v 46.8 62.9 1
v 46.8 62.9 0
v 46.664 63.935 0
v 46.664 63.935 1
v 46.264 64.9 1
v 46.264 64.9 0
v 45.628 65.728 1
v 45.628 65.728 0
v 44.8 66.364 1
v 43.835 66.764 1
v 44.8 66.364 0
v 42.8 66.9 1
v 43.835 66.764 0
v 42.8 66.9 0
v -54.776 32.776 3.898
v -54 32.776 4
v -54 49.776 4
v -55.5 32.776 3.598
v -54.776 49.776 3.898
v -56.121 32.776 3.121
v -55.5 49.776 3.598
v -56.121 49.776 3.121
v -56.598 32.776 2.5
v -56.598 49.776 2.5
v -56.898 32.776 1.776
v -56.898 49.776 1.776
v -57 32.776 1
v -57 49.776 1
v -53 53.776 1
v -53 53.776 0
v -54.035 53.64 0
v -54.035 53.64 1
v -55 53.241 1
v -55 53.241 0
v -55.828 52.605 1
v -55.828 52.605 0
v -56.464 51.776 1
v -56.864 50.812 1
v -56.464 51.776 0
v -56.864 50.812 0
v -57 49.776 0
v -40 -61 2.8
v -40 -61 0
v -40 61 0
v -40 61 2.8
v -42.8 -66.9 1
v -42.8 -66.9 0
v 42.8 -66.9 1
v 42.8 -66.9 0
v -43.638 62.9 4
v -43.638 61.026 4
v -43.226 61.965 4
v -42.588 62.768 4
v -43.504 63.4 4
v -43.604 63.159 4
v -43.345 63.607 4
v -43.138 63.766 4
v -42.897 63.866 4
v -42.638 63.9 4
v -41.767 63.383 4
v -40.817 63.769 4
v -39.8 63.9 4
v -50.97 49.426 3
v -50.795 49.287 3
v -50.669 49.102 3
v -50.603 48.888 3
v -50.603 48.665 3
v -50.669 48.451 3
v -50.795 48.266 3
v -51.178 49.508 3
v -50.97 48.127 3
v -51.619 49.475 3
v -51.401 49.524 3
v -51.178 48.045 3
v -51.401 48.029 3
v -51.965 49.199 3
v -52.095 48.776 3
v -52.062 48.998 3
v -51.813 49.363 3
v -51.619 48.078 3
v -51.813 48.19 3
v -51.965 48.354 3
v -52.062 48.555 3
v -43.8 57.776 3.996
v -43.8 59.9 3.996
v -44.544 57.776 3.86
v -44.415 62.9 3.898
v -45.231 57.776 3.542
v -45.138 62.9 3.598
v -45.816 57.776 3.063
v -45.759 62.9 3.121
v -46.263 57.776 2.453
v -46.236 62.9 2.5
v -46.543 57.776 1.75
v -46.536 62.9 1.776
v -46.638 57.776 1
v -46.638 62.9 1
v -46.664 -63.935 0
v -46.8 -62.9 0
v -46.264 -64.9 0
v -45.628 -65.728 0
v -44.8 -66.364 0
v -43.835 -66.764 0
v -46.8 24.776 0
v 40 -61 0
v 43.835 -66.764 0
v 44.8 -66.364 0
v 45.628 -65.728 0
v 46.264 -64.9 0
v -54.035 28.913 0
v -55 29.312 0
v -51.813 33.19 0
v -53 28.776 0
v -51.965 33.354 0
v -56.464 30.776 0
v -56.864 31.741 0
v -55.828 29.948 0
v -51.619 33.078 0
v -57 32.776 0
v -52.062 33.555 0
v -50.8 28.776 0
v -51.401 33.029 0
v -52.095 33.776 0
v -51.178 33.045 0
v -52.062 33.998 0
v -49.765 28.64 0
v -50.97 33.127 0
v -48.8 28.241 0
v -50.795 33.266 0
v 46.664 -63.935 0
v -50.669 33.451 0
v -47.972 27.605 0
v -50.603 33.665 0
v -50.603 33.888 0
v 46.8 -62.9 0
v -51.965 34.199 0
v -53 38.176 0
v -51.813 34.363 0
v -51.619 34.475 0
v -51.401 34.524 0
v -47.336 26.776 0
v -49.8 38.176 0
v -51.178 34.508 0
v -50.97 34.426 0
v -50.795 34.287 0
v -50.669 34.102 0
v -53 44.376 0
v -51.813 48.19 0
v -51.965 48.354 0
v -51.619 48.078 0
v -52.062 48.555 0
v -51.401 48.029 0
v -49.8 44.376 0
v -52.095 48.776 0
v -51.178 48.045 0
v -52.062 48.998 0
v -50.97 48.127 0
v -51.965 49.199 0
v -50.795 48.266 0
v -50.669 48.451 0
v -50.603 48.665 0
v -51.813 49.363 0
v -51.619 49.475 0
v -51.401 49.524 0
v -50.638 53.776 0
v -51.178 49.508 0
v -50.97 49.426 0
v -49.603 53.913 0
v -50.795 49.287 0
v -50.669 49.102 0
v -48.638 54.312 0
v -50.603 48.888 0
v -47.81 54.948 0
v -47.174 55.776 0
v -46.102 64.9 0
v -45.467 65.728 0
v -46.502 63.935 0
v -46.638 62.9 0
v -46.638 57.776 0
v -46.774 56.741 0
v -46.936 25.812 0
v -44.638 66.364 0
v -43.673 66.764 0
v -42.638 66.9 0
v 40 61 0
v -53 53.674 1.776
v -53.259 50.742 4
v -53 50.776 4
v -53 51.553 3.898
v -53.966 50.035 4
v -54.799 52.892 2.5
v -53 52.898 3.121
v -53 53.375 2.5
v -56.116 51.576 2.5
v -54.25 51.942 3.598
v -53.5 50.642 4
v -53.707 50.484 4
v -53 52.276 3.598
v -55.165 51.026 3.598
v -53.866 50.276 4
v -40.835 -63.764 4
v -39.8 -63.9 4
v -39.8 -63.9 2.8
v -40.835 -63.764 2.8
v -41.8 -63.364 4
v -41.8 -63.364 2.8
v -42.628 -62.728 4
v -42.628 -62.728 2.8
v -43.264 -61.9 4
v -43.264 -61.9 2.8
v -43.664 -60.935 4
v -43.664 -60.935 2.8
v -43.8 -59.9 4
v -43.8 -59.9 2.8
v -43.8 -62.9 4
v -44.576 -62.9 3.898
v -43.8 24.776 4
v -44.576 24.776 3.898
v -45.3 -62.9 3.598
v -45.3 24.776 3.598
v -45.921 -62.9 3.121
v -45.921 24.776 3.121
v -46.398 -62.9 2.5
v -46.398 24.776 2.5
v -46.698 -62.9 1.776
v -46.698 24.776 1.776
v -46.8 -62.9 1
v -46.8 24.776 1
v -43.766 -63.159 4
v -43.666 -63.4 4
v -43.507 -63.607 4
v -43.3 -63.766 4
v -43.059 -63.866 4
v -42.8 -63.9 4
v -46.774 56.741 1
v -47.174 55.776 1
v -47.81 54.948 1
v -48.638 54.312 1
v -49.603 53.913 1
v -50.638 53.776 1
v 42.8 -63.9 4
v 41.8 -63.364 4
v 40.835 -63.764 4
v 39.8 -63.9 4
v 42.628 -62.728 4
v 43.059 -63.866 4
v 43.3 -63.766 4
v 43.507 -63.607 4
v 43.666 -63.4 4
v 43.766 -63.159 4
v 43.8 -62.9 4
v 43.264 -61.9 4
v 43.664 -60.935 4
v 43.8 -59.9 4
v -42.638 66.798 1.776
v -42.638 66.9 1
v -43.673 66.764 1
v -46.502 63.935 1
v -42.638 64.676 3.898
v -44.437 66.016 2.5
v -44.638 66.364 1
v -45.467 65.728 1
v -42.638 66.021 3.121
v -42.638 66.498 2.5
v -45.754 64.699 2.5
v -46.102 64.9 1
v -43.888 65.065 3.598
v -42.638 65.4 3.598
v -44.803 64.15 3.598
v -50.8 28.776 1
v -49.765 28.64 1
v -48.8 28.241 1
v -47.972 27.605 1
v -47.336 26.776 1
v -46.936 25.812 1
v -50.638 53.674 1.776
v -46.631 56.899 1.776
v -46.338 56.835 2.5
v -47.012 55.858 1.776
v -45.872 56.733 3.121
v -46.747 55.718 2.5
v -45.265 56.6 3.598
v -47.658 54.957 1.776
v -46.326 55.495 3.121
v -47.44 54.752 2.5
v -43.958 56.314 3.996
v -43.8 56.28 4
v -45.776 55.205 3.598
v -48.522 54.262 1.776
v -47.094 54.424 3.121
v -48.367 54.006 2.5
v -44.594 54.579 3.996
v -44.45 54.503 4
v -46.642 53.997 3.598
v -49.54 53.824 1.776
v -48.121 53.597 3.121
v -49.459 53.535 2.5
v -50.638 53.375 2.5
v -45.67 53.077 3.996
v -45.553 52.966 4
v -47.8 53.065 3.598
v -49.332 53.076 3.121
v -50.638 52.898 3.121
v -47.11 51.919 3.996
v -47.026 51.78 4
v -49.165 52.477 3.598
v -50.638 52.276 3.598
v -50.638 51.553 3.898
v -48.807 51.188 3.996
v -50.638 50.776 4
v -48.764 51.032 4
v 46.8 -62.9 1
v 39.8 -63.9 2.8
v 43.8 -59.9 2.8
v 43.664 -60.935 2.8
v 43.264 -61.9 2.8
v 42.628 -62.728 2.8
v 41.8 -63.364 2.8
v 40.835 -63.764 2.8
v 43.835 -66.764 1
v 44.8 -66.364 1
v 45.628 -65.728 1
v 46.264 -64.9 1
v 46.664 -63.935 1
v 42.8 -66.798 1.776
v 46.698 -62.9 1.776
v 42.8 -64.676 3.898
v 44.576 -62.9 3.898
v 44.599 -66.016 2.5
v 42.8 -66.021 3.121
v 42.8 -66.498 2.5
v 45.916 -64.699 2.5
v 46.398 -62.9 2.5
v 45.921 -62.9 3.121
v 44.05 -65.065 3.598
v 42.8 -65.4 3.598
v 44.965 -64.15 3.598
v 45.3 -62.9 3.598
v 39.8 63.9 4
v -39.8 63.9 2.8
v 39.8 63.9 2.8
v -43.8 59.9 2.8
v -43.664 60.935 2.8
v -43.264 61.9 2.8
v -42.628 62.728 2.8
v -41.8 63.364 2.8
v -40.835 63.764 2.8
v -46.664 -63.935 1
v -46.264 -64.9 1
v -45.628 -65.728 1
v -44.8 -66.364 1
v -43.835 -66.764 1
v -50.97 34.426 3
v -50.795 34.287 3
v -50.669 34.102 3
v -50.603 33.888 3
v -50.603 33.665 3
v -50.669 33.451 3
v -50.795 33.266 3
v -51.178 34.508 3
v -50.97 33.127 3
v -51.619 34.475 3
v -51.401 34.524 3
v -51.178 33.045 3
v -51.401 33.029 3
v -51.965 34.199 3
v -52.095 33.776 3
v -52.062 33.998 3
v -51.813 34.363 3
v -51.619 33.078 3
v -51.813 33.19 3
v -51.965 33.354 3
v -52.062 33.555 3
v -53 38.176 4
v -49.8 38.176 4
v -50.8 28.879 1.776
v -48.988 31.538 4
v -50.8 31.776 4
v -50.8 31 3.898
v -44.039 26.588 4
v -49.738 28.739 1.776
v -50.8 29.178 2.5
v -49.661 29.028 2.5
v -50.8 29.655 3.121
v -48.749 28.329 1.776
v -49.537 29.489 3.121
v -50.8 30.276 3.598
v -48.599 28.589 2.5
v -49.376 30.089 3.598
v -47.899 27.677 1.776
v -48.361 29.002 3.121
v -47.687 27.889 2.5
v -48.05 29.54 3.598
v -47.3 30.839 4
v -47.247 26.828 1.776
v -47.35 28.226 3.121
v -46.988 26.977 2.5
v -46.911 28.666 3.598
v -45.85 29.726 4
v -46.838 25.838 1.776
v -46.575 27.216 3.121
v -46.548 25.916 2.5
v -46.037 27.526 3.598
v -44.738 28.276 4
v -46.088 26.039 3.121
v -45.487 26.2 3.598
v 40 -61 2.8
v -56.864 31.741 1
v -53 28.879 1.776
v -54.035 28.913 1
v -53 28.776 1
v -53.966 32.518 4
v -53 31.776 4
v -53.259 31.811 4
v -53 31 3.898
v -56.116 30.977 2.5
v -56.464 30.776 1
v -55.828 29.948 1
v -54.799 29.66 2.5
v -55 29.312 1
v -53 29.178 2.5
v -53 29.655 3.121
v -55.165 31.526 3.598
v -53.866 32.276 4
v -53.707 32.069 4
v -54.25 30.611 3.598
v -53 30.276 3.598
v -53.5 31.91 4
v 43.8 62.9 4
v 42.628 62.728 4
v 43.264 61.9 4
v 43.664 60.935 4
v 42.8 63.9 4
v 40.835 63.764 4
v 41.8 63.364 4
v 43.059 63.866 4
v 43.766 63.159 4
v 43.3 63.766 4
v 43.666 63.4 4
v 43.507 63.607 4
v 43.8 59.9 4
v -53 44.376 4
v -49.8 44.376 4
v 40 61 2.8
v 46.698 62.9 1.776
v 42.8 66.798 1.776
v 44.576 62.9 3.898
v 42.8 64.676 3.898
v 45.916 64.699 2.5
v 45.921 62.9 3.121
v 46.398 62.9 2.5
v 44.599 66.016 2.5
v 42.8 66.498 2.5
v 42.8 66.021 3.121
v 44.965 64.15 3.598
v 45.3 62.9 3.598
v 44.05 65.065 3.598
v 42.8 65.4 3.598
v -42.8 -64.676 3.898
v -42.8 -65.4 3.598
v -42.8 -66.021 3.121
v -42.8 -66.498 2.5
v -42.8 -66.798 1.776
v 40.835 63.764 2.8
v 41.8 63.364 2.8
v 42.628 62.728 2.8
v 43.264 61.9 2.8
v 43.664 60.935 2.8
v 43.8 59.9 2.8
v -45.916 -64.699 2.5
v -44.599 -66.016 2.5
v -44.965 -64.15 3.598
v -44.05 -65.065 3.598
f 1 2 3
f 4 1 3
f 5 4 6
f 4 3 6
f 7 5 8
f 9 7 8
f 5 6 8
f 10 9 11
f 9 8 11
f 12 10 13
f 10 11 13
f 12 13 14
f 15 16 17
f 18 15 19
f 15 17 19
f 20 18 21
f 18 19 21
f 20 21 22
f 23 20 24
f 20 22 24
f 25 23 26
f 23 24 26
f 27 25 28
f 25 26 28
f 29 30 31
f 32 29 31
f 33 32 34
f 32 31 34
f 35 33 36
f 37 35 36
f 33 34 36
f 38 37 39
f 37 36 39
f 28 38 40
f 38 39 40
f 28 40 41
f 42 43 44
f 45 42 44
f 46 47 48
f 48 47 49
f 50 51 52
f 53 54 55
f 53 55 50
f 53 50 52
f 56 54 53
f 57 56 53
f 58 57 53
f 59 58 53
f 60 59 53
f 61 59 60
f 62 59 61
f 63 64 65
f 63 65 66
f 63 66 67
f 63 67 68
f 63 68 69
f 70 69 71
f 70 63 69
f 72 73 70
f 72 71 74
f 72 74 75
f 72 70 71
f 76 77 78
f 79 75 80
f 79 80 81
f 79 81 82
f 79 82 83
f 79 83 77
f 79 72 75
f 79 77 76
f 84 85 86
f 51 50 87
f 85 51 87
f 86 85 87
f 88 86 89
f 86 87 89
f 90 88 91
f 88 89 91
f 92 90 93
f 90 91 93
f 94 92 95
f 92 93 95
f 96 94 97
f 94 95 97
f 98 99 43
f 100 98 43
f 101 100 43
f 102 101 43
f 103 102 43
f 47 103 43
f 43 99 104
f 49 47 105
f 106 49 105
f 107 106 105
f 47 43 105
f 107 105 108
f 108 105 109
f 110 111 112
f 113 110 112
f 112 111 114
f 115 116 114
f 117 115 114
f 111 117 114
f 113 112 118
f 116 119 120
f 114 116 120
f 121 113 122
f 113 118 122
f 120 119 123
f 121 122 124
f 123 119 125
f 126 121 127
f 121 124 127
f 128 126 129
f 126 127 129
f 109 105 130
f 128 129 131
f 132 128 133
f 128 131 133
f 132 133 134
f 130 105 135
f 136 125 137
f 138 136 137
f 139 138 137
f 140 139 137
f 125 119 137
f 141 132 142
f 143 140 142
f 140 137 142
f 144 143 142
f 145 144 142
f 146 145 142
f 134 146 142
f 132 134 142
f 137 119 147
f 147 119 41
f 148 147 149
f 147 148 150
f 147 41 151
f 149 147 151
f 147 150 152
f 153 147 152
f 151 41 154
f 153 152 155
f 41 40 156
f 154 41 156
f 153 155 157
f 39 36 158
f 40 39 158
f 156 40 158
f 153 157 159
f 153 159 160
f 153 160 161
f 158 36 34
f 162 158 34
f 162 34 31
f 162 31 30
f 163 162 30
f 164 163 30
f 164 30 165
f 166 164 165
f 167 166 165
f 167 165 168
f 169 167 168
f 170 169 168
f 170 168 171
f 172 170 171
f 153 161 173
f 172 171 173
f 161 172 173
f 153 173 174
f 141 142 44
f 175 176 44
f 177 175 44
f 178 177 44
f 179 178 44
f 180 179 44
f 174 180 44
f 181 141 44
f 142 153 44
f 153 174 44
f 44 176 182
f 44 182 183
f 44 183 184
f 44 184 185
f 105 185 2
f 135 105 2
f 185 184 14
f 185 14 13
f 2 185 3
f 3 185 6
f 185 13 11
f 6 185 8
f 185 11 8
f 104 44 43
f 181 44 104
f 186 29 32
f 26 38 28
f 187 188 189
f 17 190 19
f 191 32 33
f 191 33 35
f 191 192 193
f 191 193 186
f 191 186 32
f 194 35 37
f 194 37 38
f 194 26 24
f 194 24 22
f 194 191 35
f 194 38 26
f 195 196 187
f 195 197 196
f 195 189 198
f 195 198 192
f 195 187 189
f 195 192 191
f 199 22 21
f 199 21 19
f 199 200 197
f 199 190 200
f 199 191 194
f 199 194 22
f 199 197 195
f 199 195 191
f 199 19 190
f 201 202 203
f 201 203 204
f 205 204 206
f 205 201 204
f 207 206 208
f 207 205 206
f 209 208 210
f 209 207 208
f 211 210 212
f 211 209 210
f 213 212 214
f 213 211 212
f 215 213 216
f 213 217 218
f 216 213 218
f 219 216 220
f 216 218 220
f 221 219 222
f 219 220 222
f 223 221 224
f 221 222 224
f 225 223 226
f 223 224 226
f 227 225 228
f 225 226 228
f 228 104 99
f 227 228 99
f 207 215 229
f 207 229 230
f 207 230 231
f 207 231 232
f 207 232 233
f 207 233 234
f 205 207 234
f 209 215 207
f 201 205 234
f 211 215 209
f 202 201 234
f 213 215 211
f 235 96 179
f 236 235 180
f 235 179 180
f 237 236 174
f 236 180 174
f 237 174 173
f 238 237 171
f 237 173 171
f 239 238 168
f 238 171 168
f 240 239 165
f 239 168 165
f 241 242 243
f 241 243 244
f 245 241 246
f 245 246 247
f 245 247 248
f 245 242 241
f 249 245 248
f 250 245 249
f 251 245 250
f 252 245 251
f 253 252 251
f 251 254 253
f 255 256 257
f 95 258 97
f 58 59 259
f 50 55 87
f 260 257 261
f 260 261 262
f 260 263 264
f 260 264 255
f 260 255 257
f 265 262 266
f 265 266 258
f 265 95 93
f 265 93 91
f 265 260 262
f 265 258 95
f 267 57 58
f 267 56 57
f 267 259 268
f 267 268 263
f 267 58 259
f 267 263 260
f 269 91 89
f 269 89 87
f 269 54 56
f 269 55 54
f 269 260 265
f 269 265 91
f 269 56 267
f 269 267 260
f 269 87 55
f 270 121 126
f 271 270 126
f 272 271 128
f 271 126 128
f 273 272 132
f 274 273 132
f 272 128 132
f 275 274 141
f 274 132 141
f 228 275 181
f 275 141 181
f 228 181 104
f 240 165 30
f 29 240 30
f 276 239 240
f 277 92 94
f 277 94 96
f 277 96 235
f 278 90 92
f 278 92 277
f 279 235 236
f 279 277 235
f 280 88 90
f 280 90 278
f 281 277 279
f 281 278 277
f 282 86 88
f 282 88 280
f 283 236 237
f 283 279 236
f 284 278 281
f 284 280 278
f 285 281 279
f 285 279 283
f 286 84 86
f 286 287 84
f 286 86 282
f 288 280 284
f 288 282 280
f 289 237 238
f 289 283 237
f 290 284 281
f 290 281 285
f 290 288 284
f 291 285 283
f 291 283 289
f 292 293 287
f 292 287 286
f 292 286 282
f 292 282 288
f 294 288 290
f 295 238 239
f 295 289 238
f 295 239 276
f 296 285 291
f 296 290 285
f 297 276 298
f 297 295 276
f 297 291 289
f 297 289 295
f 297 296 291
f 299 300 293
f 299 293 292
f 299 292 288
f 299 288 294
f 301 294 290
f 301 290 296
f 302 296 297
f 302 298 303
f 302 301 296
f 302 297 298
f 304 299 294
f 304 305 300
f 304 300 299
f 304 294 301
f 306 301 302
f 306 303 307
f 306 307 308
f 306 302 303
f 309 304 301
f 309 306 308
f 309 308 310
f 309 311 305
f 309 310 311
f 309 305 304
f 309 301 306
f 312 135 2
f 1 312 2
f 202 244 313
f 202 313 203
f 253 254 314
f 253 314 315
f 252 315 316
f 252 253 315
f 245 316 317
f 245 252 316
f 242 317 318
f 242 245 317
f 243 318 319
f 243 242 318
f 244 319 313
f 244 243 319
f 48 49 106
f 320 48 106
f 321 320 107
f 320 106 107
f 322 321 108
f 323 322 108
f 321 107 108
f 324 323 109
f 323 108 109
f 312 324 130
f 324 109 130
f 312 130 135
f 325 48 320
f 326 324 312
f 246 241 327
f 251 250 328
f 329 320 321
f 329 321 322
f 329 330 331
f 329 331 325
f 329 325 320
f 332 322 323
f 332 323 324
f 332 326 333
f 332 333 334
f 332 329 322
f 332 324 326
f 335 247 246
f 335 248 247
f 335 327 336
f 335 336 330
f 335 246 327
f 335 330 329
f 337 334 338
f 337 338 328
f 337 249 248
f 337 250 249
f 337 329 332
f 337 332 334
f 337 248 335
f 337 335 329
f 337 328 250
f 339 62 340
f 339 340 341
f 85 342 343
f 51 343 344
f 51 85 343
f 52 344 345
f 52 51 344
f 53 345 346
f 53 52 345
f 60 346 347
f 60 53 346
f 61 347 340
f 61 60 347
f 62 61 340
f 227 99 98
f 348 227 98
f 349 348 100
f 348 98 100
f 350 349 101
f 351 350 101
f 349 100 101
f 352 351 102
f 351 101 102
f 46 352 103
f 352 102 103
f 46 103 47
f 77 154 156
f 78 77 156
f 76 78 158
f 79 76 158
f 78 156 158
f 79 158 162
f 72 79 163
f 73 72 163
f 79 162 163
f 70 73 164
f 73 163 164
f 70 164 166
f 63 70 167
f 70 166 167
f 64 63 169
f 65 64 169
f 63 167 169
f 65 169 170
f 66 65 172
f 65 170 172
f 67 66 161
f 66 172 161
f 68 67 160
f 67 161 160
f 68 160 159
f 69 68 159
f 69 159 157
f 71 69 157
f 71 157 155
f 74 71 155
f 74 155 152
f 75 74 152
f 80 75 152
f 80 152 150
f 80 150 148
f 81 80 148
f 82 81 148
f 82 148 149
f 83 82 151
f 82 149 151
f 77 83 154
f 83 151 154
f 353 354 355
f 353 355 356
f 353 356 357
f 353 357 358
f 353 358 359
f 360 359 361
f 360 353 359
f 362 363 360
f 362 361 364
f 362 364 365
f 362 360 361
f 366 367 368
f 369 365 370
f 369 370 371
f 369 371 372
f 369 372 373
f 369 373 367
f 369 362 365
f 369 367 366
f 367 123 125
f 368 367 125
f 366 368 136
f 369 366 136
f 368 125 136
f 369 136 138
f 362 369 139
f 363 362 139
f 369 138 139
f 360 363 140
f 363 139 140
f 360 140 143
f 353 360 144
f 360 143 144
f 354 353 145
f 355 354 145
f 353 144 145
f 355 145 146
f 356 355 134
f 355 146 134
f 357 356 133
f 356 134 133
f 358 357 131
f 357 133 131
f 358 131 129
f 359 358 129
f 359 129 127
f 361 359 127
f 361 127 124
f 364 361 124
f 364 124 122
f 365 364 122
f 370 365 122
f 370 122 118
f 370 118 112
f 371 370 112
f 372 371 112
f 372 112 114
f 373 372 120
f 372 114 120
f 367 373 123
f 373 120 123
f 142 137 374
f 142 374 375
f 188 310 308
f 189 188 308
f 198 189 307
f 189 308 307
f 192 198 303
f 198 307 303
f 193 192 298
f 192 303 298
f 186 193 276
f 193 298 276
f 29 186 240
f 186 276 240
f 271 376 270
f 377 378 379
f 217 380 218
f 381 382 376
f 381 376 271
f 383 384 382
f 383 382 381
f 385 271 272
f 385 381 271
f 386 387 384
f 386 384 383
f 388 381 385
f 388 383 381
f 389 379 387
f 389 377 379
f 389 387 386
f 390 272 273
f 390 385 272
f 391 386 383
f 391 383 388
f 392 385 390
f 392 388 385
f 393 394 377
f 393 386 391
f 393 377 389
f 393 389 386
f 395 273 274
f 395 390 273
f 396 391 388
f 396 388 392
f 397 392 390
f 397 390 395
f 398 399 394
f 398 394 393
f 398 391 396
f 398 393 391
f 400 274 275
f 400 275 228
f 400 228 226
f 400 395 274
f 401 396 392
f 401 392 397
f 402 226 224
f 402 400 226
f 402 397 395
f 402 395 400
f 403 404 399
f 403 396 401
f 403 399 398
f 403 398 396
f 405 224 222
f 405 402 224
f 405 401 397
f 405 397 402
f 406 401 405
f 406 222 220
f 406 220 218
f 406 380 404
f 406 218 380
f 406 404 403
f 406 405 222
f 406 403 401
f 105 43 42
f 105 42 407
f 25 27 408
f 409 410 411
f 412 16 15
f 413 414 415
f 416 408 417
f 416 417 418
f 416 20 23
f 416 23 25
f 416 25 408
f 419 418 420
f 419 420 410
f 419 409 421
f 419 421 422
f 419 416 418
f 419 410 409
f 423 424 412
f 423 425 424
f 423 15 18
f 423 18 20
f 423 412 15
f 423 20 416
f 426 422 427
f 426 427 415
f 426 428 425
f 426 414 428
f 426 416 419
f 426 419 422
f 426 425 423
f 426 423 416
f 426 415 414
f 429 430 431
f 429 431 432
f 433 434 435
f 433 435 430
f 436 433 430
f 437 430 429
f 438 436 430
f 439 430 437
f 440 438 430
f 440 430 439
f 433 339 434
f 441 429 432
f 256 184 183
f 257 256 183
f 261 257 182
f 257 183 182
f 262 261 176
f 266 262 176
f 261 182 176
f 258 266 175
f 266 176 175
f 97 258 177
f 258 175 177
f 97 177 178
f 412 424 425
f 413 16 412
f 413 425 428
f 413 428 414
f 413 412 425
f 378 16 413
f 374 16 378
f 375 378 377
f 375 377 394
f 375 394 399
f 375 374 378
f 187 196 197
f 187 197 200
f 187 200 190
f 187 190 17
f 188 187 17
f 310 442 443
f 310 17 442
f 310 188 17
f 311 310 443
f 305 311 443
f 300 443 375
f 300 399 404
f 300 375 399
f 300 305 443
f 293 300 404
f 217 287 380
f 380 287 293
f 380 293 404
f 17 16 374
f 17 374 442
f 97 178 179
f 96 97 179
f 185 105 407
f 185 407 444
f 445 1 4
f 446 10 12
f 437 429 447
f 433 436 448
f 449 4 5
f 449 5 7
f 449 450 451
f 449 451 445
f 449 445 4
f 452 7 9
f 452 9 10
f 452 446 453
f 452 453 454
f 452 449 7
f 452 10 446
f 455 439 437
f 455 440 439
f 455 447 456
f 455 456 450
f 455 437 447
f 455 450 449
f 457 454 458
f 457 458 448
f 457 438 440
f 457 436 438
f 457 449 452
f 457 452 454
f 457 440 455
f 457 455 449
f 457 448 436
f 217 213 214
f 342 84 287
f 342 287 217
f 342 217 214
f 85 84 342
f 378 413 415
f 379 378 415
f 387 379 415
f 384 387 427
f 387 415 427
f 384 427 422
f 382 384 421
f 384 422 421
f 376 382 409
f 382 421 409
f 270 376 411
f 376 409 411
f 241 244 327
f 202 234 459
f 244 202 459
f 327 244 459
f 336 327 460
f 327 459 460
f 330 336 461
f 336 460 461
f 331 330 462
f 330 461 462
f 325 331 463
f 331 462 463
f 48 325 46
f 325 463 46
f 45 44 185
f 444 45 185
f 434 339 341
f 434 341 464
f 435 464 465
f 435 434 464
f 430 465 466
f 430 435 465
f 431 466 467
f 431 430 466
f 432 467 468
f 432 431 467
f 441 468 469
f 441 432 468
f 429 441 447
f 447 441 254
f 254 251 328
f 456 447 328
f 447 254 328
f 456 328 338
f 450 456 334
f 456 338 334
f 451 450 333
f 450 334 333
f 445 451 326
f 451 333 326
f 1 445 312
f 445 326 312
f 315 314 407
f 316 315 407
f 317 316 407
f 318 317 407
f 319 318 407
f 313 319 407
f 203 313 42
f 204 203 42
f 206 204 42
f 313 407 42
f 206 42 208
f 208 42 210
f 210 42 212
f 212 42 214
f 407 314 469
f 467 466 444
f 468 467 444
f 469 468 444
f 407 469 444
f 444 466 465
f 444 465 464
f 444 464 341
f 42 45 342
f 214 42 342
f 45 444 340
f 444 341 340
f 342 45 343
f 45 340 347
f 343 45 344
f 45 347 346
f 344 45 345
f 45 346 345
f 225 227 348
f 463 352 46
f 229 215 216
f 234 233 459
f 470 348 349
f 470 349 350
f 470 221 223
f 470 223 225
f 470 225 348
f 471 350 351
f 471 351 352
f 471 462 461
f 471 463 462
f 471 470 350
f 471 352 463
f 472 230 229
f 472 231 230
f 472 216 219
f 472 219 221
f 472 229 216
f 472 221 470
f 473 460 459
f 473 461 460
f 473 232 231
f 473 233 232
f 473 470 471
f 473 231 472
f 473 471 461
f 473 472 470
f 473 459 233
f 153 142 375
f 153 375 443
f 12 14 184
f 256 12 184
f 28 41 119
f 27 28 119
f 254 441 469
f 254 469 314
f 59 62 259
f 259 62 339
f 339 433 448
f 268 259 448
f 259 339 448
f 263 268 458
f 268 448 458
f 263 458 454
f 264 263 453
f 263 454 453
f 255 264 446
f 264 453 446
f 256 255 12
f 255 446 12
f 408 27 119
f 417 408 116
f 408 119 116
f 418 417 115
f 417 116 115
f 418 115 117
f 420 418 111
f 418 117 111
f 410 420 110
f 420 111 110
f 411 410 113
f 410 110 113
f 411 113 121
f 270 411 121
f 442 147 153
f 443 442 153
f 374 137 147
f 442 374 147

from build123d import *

# Parameters (mm, degrees)
SCHIZZO1_W                   = 3.2
SCHIZZO1_H                   = 6.2
SCHIZZO1_W_2                 = 80
SCHIZZO1_H_2                 = 122
ESTRUSIONE_ESTRUSIONE1_DEPTH = 4
SCHIZZO5_W                   = 80
SCHIZZO5_H                   = 122
TAGLIO_ESTRUSIONE4_DEPTH     = 1.2
SCHIZZO6_R                   = 0.75
TAGLIO_ESTRUSIONE5_DEPTH     = 3
RACCORDO1_R                  = 3


with BuildPart() as part:
    # Schizzo1 → Estrusione-Estrusione1 (new body)
    with BuildSketch(Plane.XY):
        with BuildLine():
            Line((-42.8, -66.9), (42.8, -66.9))
            ThreePointArc((42.8, -66.9), (45.628427125, -65.728427125), (46.8, -62.9))
            Line((46.8, -62.9), (46.8, 62.9))
            ThreePointArc((46.8, 62.9), (45.628427125, 65.728427125), (42.8, 66.9))
            Line((42.8, 66.9), (-42.638118868, 66.9))
            ThreePointArc((-42.638118868, 66.9), (-45.466545993, 65.728427125), (-46.638118868, 62.9))
            Line((-46.638118868, 62.9), (-46.638118868, 57.77646377))
            ThreePointArc((-46.638118868, 57.77646377), (-47.809691743, 54.948036646), (-50.638118868, 53.77646377))
            Line((-50.638118868, 53.77646377), (-53, 53.77646377))
            ThreePointArc((-53, 53.77646377), (-55.828427125, 52.604890895), (-57, 49.77646377))
            Line((-57, 49.77646377), (-57, 32.77646377))
            ThreePointArc((-57, 32.77646377), (-55.828427125, 29.948036646), (-53, 28.77646377))
            Line((-53, 28.77646377), (-50.8, 28.77646377))
            ThreePointArc((-50.8, 28.77646377), (-47.971572875, 27.604890895), (-46.8, 24.77646377))
            Line((-46.8, 24.77646377), (-46.8, -62.9))
            ThreePointArc((-46.8, -62.9), (-45.628427125, -65.728427125), (-42.8, -66.9))
        make_face()
        with Locations((-51.4, 41.27646377)):
            Rectangle(SCHIZZO1_W, SCHIZZO1_H, mode=Mode.SUBTRACT)
        Rectangle(SCHIZZO1_W_2, SCHIZZO1_H_2, mode=Mode.SUBTRACT)
    extrude(amount=ESTRUSIONE_ESTRUSIONE1_DEPTH)

    # Schizzo5 → Taglio-Estrusione4 (cut)
    with BuildSketch(Plane.XY.offset(4)):
        with BuildLine():
            Line((-39.8, 63.9), (39.8, 63.9))
            ThreePointArc((39.8, 63.9), (42.628427125, 62.728427125), (43.8, 59.9))
            Line((43.8, 59.9), (43.8, -59.9))
            ThreePointArc((43.8, -59.9), (42.628427125, -62.728427125), (39.8, -63.9))
            Line((39.8, -63.9), (-39.8, -63.9))
            ThreePointArc((-39.8, -63.9), (-42.628427125, -62.728427125), (-43.8, -59.9))
            Line((-43.8, -59.9), (-43.8, 59.9))
            ThreePointArc((-43.8, 59.9), (-42.628427125, 62.728427125), (-39.8, 63.9))
        make_face()
        Rectangle(SCHIZZO5_W, SCHIZZO5_H, mode=Mode.SUBTRACT)
    extrude(amount=-TAGLIO_ESTRUSIONE4_DEPTH, mode=Mode.SUBTRACT)

    # Schizzo6 → Taglio-Estrusione5 (cut)
    with BuildSketch(Plane(origin=(0, 0, 0), x_dir=(-1, 0, 0), z_dir=(0, 0, -1))):
        with Locations((51.344911825, 48.77646377)):
            Circle(SCHIZZO6_R)
        with Locations((51.344911825, 33.77646377)):
            Circle(SCHIZZO6_R)
    extrude(amount=-TAGLIO_ESTRUSIONE5_DEPTH, mode=Mode.SUBTRACT)

    # Raccordo1
    # the kernel refuses this fillet: 3 mm, written as the material it takes off along each edge
    with BuildSketch(Plane(origin=(-42.8, -66.9, 4), x_dir=(0, 0, -1), z_dir=(1, 0, 0))) as raccordo1_piece_1:
        with BuildLine():
            CenterArc((RACCORDO1_R, RACCORDO1_R), RACCORDO1_R, 180, 90)
            Line((0, RACCORDO1_R), (0, 0))
            Line((0, 0), (RACCORDO1_R, 0))
        make_face()
    extrude(amount=85.6, mode=Mode.SUBTRACT)
    with BuildSketch(Plane(origin=(42.8, -62.9, 4), x_dir=(0, -1, 0), z_dir=(-1, 0, 0))) as raccordo1_piece_2:
        with BuildLine():
            CenterArc((4 - RACCORDO1_R, -RACCORDO1_R), RACCORDO1_R, 0, 90)
            Line((4 - RACCORDO1_R, 0), (4, 0))
            Line((4, 0), (4, -RACCORDO1_R))
        make_face()
    revolve(axis=Axis((42.8, -62.9, 4), (0, 0, 1)), revolution_arc=90, mode=Mode.SUBTRACT)
    with BuildSketch(Plane(origin=(46.8, -62.9, 4), x_dir=(-1, 0, 0), z_dir=(0, 1, 0))) as raccordo1_piece_3:
        with BuildLine():
            CenterArc((RACCORDO1_R, -RACCORDO1_R), RACCORDO1_R, 90, 90)
            Line((0, -RACCORDO1_R), (0, 0))
            Line((0, 0), (RACCORDO1_R, 0))
        make_face()
    extrude(amount=125.8, mode=Mode.SUBTRACT)
    with BuildSketch(Plane(origin=(42.8, 62.9, 4), x_dir=(1, 0, 0), z_dir=(0, -1, 0))) as raccordo1_piece_4:
        with BuildLine():
            CenterArc((4 - RACCORDO1_R, -RACCORDO1_R), RACCORDO1_R, 0, 90)
            Line((4, -RACCORDO1_R), (4, 0))
            Line((4, 0), (4 - RACCORDO1_R, 0))
        make_face()
    revolve(axis=Axis((42.8, 62.9, 4), (0, 0, 1)), revolution_arc=90, mode=Mode.SUBTRACT)
    with BuildSketch(Plane(origin=(42.8, 66.9, 4), x_dir=(0, -1, 0), z_dir=(-1, 0, 0))) as raccordo1_piece_5:
        with BuildLine():
            CenterArc((RACCORDO1_R, -RACCORDO1_R), RACCORDO1_R, 90, 90)
            Line((0, -RACCORDO1_R), (0, 0))
            Line((0, 0), (RACCORDO1_R, 0))
        make_face()
    extrude(amount=85.438118868, mode=Mode.SUBTRACT)
    with BuildSketch(Plane(origin=(-42.638118868, 62.9, 4), x_dir=(0, 1, 0), z_dir=(1, 0, 0))) as raccordo1_piece_6:
        with BuildLine():
            CenterArc((4 - RACCORDO1_R, -RACCORDO1_R), RACCORDO1_R, 0, 90)
            Line((4, -RACCORDO1_R), (4, 0))
            Line((4, 0), (4 - RACCORDO1_R, 0))
        make_face()
    revolve(axis=Axis((-42.638118868, 62.9, 4), (0, 0, 1)), revolution_arc=90, mode=Mode.SUBTRACT)
    with BuildSketch(Plane(origin=(-46.638118868, 62.9, 4), x_dir=(1, 0, 0), z_dir=(0, -1, 0))) as raccordo1_piece_7:
        with BuildLine():
            CenterArc((RACCORDO1_R, -RACCORDO1_R), RACCORDO1_R, 90, 90)
            Line((0, -RACCORDO1_R), (0, 0))
            Line((0, 0), (RACCORDO1_R, 0))
        make_face()
    extrude(amount=5.12353623, mode=Mode.SUBTRACT)
    with BuildSketch(Plane(origin=(-50.638118868, 57.77646377, 4), x_dir=(1, 0, 0), z_dir=(0, 1, 0))) as raccordo1_piece_8:
        with BuildLine():
            CenterArc((4 + RACCORDO1_R, RACCORDO1_R), RACCORDO1_R, 180, 90)
            Line((4, RACCORDO1_R), (4, 0))
            Line((4, 0), (4 + RACCORDO1_R, 0))
        make_face()
    revolve(axis=Axis((-50.638118868, 57.77646377, 4), (0, 0, -1)), revolution_arc=90, mode=Mode.SUBTRACT)
    with BuildSketch(Plane(origin=(-50.638118868, 53.77646377, 4), x_dir=(0, -1, 0), z_dir=(-1, 0, 0))) as raccordo1_piece_9:
        with BuildLine():
            CenterArc((RACCORDO1_R, -RACCORDO1_R), RACCORDO1_R, 90, 90)
            Line((0, -RACCORDO1_R), (0, 0))
            Line((0, 0), (RACCORDO1_R, 0))
        make_face()
    extrude(amount=2.361881132, mode=Mode.SUBTRACT)
    with BuildSketch(Plane(origin=(-53, 49.77646377, 4), x_dir=(0, 1, 0), z_dir=(1, 0, 0))) as raccordo1_piece_10:
        with BuildLine():
            CenterArc((4 - RACCORDO1_R, -RACCORDO1_R), RACCORDO1_R, 0, 90)
            Line((4, -RACCORDO1_R), (4, 0))
            Line((4, 0), (4 - RACCORDO1_R, 0))
        make_face()
    revolve(axis=Axis((-53, 49.77646377, 4), (0, 0, 1)), revolution_arc=90, mode=Mode.SUBTRACT)
    with BuildSketch(Plane(origin=(-57, 49.77646377, 4), x_dir=(1, 0, 0), z_dir=(0, -1, 0))) as raccordo1_piece_11:
        with BuildLine():
            CenterArc((RACCORDO1_R, -RACCORDO1_R), RACCORDO1_R, 90, 90)
            Line((0, -RACCORDO1_R), (0, 0))
            Line((0, 0), (RACCORDO1_R, 0))
        make_face()
    extrude(amount=17, mode=Mode.SUBTRACT)
    with BuildSketch(Plane(origin=(-53, 32.77646377, 4), x_dir=(-1, 0, 0), z_dir=(0, 1, 0))) as raccordo1_piece_12:
        with BuildLine():
            CenterArc((4 - RACCORDO1_R, -RACCORDO1_R), RACCORDO1_R, 0, 90)
            Line((4, -RACCORDO1_R), (4, 0))
            Line((4, 0), (4 - RACCORDO1_R, 0))
        make_face()
    revolve(axis=Axis((-53, 32.77646377, 4), (0, 0, 1)), revolution_arc=90, mode=Mode.SUBTRACT)
    with BuildSketch(Plane(origin=(-53, 28.77646377, 4), x_dir=(0, 1, 0), z_dir=(1, 0, 0))) as raccordo1_piece_13:
        with BuildLine():
            CenterArc((RACCORDO1_R, -RACCORDO1_R), RACCORDO1_R, 90, 90)
            Line((0, -RACCORDO1_R), (0, 0))
            Line((0, 0), (RACCORDO1_R, 0))
        make_face()
    extrude(amount=2.2, mode=Mode.SUBTRACT)
    with BuildSketch(Plane(origin=(-50.8, 24.77646377, 4), x_dir=(0, 1, 0), z_dir=(-1, 0, 0))) as raccordo1_piece_14:
        with BuildLine():
            CenterArc((4 + RACCORDO1_R, RACCORDO1_R), RACCORDO1_R, 180, 90)
            Line((4, RACCORDO1_R), (4, 0))
            Line((4, 0), (4 + RACCORDO1_R, 0))
        make_face()
    revolve(axis=Axis((-50.8, 24.77646377, 4), (0, 0, -1)), revolution_arc=90, mode=Mode.SUBTRACT)
    with BuildSketch(Plane(origin=(-46.8, 24.77646377, 4), x_dir=(1, 0, 0), z_dir=(0, -1, 0))) as raccordo1_piece_15:
        with BuildLine():
            CenterArc((RACCORDO1_R, -RACCORDO1_R), RACCORDO1_R, 90, 90)
            Line((0, -RACCORDO1_R), (0, 0))
            Line((0, 0), (RACCORDO1_R, 0))
        make_face()
    extrude(amount=87.67646377, mode=Mode.SUBTRACT)
    with BuildSketch(Plane(origin=(-42.8, -62.9, 4), x_dir=(-1, 0, 0), z_dir=(0, 1, 0))) as raccordo1_piece_16:
        with BuildLine():
            CenterArc((4 - RACCORDO1_R, -RACCORDO1_R), RACCORDO1_R, 0, 90)
            Line((4 - RACCORDO1_R, 0), (4, 0))
            Line((4, 0), (4, -RACCORDO1_R))
        make_face()
    revolve(axis=Axis((-42.8, -62.9, 4), (0, 0, 1)), revolution_arc=90, mode=Mode.SUBTRACT)


solid = part.part
